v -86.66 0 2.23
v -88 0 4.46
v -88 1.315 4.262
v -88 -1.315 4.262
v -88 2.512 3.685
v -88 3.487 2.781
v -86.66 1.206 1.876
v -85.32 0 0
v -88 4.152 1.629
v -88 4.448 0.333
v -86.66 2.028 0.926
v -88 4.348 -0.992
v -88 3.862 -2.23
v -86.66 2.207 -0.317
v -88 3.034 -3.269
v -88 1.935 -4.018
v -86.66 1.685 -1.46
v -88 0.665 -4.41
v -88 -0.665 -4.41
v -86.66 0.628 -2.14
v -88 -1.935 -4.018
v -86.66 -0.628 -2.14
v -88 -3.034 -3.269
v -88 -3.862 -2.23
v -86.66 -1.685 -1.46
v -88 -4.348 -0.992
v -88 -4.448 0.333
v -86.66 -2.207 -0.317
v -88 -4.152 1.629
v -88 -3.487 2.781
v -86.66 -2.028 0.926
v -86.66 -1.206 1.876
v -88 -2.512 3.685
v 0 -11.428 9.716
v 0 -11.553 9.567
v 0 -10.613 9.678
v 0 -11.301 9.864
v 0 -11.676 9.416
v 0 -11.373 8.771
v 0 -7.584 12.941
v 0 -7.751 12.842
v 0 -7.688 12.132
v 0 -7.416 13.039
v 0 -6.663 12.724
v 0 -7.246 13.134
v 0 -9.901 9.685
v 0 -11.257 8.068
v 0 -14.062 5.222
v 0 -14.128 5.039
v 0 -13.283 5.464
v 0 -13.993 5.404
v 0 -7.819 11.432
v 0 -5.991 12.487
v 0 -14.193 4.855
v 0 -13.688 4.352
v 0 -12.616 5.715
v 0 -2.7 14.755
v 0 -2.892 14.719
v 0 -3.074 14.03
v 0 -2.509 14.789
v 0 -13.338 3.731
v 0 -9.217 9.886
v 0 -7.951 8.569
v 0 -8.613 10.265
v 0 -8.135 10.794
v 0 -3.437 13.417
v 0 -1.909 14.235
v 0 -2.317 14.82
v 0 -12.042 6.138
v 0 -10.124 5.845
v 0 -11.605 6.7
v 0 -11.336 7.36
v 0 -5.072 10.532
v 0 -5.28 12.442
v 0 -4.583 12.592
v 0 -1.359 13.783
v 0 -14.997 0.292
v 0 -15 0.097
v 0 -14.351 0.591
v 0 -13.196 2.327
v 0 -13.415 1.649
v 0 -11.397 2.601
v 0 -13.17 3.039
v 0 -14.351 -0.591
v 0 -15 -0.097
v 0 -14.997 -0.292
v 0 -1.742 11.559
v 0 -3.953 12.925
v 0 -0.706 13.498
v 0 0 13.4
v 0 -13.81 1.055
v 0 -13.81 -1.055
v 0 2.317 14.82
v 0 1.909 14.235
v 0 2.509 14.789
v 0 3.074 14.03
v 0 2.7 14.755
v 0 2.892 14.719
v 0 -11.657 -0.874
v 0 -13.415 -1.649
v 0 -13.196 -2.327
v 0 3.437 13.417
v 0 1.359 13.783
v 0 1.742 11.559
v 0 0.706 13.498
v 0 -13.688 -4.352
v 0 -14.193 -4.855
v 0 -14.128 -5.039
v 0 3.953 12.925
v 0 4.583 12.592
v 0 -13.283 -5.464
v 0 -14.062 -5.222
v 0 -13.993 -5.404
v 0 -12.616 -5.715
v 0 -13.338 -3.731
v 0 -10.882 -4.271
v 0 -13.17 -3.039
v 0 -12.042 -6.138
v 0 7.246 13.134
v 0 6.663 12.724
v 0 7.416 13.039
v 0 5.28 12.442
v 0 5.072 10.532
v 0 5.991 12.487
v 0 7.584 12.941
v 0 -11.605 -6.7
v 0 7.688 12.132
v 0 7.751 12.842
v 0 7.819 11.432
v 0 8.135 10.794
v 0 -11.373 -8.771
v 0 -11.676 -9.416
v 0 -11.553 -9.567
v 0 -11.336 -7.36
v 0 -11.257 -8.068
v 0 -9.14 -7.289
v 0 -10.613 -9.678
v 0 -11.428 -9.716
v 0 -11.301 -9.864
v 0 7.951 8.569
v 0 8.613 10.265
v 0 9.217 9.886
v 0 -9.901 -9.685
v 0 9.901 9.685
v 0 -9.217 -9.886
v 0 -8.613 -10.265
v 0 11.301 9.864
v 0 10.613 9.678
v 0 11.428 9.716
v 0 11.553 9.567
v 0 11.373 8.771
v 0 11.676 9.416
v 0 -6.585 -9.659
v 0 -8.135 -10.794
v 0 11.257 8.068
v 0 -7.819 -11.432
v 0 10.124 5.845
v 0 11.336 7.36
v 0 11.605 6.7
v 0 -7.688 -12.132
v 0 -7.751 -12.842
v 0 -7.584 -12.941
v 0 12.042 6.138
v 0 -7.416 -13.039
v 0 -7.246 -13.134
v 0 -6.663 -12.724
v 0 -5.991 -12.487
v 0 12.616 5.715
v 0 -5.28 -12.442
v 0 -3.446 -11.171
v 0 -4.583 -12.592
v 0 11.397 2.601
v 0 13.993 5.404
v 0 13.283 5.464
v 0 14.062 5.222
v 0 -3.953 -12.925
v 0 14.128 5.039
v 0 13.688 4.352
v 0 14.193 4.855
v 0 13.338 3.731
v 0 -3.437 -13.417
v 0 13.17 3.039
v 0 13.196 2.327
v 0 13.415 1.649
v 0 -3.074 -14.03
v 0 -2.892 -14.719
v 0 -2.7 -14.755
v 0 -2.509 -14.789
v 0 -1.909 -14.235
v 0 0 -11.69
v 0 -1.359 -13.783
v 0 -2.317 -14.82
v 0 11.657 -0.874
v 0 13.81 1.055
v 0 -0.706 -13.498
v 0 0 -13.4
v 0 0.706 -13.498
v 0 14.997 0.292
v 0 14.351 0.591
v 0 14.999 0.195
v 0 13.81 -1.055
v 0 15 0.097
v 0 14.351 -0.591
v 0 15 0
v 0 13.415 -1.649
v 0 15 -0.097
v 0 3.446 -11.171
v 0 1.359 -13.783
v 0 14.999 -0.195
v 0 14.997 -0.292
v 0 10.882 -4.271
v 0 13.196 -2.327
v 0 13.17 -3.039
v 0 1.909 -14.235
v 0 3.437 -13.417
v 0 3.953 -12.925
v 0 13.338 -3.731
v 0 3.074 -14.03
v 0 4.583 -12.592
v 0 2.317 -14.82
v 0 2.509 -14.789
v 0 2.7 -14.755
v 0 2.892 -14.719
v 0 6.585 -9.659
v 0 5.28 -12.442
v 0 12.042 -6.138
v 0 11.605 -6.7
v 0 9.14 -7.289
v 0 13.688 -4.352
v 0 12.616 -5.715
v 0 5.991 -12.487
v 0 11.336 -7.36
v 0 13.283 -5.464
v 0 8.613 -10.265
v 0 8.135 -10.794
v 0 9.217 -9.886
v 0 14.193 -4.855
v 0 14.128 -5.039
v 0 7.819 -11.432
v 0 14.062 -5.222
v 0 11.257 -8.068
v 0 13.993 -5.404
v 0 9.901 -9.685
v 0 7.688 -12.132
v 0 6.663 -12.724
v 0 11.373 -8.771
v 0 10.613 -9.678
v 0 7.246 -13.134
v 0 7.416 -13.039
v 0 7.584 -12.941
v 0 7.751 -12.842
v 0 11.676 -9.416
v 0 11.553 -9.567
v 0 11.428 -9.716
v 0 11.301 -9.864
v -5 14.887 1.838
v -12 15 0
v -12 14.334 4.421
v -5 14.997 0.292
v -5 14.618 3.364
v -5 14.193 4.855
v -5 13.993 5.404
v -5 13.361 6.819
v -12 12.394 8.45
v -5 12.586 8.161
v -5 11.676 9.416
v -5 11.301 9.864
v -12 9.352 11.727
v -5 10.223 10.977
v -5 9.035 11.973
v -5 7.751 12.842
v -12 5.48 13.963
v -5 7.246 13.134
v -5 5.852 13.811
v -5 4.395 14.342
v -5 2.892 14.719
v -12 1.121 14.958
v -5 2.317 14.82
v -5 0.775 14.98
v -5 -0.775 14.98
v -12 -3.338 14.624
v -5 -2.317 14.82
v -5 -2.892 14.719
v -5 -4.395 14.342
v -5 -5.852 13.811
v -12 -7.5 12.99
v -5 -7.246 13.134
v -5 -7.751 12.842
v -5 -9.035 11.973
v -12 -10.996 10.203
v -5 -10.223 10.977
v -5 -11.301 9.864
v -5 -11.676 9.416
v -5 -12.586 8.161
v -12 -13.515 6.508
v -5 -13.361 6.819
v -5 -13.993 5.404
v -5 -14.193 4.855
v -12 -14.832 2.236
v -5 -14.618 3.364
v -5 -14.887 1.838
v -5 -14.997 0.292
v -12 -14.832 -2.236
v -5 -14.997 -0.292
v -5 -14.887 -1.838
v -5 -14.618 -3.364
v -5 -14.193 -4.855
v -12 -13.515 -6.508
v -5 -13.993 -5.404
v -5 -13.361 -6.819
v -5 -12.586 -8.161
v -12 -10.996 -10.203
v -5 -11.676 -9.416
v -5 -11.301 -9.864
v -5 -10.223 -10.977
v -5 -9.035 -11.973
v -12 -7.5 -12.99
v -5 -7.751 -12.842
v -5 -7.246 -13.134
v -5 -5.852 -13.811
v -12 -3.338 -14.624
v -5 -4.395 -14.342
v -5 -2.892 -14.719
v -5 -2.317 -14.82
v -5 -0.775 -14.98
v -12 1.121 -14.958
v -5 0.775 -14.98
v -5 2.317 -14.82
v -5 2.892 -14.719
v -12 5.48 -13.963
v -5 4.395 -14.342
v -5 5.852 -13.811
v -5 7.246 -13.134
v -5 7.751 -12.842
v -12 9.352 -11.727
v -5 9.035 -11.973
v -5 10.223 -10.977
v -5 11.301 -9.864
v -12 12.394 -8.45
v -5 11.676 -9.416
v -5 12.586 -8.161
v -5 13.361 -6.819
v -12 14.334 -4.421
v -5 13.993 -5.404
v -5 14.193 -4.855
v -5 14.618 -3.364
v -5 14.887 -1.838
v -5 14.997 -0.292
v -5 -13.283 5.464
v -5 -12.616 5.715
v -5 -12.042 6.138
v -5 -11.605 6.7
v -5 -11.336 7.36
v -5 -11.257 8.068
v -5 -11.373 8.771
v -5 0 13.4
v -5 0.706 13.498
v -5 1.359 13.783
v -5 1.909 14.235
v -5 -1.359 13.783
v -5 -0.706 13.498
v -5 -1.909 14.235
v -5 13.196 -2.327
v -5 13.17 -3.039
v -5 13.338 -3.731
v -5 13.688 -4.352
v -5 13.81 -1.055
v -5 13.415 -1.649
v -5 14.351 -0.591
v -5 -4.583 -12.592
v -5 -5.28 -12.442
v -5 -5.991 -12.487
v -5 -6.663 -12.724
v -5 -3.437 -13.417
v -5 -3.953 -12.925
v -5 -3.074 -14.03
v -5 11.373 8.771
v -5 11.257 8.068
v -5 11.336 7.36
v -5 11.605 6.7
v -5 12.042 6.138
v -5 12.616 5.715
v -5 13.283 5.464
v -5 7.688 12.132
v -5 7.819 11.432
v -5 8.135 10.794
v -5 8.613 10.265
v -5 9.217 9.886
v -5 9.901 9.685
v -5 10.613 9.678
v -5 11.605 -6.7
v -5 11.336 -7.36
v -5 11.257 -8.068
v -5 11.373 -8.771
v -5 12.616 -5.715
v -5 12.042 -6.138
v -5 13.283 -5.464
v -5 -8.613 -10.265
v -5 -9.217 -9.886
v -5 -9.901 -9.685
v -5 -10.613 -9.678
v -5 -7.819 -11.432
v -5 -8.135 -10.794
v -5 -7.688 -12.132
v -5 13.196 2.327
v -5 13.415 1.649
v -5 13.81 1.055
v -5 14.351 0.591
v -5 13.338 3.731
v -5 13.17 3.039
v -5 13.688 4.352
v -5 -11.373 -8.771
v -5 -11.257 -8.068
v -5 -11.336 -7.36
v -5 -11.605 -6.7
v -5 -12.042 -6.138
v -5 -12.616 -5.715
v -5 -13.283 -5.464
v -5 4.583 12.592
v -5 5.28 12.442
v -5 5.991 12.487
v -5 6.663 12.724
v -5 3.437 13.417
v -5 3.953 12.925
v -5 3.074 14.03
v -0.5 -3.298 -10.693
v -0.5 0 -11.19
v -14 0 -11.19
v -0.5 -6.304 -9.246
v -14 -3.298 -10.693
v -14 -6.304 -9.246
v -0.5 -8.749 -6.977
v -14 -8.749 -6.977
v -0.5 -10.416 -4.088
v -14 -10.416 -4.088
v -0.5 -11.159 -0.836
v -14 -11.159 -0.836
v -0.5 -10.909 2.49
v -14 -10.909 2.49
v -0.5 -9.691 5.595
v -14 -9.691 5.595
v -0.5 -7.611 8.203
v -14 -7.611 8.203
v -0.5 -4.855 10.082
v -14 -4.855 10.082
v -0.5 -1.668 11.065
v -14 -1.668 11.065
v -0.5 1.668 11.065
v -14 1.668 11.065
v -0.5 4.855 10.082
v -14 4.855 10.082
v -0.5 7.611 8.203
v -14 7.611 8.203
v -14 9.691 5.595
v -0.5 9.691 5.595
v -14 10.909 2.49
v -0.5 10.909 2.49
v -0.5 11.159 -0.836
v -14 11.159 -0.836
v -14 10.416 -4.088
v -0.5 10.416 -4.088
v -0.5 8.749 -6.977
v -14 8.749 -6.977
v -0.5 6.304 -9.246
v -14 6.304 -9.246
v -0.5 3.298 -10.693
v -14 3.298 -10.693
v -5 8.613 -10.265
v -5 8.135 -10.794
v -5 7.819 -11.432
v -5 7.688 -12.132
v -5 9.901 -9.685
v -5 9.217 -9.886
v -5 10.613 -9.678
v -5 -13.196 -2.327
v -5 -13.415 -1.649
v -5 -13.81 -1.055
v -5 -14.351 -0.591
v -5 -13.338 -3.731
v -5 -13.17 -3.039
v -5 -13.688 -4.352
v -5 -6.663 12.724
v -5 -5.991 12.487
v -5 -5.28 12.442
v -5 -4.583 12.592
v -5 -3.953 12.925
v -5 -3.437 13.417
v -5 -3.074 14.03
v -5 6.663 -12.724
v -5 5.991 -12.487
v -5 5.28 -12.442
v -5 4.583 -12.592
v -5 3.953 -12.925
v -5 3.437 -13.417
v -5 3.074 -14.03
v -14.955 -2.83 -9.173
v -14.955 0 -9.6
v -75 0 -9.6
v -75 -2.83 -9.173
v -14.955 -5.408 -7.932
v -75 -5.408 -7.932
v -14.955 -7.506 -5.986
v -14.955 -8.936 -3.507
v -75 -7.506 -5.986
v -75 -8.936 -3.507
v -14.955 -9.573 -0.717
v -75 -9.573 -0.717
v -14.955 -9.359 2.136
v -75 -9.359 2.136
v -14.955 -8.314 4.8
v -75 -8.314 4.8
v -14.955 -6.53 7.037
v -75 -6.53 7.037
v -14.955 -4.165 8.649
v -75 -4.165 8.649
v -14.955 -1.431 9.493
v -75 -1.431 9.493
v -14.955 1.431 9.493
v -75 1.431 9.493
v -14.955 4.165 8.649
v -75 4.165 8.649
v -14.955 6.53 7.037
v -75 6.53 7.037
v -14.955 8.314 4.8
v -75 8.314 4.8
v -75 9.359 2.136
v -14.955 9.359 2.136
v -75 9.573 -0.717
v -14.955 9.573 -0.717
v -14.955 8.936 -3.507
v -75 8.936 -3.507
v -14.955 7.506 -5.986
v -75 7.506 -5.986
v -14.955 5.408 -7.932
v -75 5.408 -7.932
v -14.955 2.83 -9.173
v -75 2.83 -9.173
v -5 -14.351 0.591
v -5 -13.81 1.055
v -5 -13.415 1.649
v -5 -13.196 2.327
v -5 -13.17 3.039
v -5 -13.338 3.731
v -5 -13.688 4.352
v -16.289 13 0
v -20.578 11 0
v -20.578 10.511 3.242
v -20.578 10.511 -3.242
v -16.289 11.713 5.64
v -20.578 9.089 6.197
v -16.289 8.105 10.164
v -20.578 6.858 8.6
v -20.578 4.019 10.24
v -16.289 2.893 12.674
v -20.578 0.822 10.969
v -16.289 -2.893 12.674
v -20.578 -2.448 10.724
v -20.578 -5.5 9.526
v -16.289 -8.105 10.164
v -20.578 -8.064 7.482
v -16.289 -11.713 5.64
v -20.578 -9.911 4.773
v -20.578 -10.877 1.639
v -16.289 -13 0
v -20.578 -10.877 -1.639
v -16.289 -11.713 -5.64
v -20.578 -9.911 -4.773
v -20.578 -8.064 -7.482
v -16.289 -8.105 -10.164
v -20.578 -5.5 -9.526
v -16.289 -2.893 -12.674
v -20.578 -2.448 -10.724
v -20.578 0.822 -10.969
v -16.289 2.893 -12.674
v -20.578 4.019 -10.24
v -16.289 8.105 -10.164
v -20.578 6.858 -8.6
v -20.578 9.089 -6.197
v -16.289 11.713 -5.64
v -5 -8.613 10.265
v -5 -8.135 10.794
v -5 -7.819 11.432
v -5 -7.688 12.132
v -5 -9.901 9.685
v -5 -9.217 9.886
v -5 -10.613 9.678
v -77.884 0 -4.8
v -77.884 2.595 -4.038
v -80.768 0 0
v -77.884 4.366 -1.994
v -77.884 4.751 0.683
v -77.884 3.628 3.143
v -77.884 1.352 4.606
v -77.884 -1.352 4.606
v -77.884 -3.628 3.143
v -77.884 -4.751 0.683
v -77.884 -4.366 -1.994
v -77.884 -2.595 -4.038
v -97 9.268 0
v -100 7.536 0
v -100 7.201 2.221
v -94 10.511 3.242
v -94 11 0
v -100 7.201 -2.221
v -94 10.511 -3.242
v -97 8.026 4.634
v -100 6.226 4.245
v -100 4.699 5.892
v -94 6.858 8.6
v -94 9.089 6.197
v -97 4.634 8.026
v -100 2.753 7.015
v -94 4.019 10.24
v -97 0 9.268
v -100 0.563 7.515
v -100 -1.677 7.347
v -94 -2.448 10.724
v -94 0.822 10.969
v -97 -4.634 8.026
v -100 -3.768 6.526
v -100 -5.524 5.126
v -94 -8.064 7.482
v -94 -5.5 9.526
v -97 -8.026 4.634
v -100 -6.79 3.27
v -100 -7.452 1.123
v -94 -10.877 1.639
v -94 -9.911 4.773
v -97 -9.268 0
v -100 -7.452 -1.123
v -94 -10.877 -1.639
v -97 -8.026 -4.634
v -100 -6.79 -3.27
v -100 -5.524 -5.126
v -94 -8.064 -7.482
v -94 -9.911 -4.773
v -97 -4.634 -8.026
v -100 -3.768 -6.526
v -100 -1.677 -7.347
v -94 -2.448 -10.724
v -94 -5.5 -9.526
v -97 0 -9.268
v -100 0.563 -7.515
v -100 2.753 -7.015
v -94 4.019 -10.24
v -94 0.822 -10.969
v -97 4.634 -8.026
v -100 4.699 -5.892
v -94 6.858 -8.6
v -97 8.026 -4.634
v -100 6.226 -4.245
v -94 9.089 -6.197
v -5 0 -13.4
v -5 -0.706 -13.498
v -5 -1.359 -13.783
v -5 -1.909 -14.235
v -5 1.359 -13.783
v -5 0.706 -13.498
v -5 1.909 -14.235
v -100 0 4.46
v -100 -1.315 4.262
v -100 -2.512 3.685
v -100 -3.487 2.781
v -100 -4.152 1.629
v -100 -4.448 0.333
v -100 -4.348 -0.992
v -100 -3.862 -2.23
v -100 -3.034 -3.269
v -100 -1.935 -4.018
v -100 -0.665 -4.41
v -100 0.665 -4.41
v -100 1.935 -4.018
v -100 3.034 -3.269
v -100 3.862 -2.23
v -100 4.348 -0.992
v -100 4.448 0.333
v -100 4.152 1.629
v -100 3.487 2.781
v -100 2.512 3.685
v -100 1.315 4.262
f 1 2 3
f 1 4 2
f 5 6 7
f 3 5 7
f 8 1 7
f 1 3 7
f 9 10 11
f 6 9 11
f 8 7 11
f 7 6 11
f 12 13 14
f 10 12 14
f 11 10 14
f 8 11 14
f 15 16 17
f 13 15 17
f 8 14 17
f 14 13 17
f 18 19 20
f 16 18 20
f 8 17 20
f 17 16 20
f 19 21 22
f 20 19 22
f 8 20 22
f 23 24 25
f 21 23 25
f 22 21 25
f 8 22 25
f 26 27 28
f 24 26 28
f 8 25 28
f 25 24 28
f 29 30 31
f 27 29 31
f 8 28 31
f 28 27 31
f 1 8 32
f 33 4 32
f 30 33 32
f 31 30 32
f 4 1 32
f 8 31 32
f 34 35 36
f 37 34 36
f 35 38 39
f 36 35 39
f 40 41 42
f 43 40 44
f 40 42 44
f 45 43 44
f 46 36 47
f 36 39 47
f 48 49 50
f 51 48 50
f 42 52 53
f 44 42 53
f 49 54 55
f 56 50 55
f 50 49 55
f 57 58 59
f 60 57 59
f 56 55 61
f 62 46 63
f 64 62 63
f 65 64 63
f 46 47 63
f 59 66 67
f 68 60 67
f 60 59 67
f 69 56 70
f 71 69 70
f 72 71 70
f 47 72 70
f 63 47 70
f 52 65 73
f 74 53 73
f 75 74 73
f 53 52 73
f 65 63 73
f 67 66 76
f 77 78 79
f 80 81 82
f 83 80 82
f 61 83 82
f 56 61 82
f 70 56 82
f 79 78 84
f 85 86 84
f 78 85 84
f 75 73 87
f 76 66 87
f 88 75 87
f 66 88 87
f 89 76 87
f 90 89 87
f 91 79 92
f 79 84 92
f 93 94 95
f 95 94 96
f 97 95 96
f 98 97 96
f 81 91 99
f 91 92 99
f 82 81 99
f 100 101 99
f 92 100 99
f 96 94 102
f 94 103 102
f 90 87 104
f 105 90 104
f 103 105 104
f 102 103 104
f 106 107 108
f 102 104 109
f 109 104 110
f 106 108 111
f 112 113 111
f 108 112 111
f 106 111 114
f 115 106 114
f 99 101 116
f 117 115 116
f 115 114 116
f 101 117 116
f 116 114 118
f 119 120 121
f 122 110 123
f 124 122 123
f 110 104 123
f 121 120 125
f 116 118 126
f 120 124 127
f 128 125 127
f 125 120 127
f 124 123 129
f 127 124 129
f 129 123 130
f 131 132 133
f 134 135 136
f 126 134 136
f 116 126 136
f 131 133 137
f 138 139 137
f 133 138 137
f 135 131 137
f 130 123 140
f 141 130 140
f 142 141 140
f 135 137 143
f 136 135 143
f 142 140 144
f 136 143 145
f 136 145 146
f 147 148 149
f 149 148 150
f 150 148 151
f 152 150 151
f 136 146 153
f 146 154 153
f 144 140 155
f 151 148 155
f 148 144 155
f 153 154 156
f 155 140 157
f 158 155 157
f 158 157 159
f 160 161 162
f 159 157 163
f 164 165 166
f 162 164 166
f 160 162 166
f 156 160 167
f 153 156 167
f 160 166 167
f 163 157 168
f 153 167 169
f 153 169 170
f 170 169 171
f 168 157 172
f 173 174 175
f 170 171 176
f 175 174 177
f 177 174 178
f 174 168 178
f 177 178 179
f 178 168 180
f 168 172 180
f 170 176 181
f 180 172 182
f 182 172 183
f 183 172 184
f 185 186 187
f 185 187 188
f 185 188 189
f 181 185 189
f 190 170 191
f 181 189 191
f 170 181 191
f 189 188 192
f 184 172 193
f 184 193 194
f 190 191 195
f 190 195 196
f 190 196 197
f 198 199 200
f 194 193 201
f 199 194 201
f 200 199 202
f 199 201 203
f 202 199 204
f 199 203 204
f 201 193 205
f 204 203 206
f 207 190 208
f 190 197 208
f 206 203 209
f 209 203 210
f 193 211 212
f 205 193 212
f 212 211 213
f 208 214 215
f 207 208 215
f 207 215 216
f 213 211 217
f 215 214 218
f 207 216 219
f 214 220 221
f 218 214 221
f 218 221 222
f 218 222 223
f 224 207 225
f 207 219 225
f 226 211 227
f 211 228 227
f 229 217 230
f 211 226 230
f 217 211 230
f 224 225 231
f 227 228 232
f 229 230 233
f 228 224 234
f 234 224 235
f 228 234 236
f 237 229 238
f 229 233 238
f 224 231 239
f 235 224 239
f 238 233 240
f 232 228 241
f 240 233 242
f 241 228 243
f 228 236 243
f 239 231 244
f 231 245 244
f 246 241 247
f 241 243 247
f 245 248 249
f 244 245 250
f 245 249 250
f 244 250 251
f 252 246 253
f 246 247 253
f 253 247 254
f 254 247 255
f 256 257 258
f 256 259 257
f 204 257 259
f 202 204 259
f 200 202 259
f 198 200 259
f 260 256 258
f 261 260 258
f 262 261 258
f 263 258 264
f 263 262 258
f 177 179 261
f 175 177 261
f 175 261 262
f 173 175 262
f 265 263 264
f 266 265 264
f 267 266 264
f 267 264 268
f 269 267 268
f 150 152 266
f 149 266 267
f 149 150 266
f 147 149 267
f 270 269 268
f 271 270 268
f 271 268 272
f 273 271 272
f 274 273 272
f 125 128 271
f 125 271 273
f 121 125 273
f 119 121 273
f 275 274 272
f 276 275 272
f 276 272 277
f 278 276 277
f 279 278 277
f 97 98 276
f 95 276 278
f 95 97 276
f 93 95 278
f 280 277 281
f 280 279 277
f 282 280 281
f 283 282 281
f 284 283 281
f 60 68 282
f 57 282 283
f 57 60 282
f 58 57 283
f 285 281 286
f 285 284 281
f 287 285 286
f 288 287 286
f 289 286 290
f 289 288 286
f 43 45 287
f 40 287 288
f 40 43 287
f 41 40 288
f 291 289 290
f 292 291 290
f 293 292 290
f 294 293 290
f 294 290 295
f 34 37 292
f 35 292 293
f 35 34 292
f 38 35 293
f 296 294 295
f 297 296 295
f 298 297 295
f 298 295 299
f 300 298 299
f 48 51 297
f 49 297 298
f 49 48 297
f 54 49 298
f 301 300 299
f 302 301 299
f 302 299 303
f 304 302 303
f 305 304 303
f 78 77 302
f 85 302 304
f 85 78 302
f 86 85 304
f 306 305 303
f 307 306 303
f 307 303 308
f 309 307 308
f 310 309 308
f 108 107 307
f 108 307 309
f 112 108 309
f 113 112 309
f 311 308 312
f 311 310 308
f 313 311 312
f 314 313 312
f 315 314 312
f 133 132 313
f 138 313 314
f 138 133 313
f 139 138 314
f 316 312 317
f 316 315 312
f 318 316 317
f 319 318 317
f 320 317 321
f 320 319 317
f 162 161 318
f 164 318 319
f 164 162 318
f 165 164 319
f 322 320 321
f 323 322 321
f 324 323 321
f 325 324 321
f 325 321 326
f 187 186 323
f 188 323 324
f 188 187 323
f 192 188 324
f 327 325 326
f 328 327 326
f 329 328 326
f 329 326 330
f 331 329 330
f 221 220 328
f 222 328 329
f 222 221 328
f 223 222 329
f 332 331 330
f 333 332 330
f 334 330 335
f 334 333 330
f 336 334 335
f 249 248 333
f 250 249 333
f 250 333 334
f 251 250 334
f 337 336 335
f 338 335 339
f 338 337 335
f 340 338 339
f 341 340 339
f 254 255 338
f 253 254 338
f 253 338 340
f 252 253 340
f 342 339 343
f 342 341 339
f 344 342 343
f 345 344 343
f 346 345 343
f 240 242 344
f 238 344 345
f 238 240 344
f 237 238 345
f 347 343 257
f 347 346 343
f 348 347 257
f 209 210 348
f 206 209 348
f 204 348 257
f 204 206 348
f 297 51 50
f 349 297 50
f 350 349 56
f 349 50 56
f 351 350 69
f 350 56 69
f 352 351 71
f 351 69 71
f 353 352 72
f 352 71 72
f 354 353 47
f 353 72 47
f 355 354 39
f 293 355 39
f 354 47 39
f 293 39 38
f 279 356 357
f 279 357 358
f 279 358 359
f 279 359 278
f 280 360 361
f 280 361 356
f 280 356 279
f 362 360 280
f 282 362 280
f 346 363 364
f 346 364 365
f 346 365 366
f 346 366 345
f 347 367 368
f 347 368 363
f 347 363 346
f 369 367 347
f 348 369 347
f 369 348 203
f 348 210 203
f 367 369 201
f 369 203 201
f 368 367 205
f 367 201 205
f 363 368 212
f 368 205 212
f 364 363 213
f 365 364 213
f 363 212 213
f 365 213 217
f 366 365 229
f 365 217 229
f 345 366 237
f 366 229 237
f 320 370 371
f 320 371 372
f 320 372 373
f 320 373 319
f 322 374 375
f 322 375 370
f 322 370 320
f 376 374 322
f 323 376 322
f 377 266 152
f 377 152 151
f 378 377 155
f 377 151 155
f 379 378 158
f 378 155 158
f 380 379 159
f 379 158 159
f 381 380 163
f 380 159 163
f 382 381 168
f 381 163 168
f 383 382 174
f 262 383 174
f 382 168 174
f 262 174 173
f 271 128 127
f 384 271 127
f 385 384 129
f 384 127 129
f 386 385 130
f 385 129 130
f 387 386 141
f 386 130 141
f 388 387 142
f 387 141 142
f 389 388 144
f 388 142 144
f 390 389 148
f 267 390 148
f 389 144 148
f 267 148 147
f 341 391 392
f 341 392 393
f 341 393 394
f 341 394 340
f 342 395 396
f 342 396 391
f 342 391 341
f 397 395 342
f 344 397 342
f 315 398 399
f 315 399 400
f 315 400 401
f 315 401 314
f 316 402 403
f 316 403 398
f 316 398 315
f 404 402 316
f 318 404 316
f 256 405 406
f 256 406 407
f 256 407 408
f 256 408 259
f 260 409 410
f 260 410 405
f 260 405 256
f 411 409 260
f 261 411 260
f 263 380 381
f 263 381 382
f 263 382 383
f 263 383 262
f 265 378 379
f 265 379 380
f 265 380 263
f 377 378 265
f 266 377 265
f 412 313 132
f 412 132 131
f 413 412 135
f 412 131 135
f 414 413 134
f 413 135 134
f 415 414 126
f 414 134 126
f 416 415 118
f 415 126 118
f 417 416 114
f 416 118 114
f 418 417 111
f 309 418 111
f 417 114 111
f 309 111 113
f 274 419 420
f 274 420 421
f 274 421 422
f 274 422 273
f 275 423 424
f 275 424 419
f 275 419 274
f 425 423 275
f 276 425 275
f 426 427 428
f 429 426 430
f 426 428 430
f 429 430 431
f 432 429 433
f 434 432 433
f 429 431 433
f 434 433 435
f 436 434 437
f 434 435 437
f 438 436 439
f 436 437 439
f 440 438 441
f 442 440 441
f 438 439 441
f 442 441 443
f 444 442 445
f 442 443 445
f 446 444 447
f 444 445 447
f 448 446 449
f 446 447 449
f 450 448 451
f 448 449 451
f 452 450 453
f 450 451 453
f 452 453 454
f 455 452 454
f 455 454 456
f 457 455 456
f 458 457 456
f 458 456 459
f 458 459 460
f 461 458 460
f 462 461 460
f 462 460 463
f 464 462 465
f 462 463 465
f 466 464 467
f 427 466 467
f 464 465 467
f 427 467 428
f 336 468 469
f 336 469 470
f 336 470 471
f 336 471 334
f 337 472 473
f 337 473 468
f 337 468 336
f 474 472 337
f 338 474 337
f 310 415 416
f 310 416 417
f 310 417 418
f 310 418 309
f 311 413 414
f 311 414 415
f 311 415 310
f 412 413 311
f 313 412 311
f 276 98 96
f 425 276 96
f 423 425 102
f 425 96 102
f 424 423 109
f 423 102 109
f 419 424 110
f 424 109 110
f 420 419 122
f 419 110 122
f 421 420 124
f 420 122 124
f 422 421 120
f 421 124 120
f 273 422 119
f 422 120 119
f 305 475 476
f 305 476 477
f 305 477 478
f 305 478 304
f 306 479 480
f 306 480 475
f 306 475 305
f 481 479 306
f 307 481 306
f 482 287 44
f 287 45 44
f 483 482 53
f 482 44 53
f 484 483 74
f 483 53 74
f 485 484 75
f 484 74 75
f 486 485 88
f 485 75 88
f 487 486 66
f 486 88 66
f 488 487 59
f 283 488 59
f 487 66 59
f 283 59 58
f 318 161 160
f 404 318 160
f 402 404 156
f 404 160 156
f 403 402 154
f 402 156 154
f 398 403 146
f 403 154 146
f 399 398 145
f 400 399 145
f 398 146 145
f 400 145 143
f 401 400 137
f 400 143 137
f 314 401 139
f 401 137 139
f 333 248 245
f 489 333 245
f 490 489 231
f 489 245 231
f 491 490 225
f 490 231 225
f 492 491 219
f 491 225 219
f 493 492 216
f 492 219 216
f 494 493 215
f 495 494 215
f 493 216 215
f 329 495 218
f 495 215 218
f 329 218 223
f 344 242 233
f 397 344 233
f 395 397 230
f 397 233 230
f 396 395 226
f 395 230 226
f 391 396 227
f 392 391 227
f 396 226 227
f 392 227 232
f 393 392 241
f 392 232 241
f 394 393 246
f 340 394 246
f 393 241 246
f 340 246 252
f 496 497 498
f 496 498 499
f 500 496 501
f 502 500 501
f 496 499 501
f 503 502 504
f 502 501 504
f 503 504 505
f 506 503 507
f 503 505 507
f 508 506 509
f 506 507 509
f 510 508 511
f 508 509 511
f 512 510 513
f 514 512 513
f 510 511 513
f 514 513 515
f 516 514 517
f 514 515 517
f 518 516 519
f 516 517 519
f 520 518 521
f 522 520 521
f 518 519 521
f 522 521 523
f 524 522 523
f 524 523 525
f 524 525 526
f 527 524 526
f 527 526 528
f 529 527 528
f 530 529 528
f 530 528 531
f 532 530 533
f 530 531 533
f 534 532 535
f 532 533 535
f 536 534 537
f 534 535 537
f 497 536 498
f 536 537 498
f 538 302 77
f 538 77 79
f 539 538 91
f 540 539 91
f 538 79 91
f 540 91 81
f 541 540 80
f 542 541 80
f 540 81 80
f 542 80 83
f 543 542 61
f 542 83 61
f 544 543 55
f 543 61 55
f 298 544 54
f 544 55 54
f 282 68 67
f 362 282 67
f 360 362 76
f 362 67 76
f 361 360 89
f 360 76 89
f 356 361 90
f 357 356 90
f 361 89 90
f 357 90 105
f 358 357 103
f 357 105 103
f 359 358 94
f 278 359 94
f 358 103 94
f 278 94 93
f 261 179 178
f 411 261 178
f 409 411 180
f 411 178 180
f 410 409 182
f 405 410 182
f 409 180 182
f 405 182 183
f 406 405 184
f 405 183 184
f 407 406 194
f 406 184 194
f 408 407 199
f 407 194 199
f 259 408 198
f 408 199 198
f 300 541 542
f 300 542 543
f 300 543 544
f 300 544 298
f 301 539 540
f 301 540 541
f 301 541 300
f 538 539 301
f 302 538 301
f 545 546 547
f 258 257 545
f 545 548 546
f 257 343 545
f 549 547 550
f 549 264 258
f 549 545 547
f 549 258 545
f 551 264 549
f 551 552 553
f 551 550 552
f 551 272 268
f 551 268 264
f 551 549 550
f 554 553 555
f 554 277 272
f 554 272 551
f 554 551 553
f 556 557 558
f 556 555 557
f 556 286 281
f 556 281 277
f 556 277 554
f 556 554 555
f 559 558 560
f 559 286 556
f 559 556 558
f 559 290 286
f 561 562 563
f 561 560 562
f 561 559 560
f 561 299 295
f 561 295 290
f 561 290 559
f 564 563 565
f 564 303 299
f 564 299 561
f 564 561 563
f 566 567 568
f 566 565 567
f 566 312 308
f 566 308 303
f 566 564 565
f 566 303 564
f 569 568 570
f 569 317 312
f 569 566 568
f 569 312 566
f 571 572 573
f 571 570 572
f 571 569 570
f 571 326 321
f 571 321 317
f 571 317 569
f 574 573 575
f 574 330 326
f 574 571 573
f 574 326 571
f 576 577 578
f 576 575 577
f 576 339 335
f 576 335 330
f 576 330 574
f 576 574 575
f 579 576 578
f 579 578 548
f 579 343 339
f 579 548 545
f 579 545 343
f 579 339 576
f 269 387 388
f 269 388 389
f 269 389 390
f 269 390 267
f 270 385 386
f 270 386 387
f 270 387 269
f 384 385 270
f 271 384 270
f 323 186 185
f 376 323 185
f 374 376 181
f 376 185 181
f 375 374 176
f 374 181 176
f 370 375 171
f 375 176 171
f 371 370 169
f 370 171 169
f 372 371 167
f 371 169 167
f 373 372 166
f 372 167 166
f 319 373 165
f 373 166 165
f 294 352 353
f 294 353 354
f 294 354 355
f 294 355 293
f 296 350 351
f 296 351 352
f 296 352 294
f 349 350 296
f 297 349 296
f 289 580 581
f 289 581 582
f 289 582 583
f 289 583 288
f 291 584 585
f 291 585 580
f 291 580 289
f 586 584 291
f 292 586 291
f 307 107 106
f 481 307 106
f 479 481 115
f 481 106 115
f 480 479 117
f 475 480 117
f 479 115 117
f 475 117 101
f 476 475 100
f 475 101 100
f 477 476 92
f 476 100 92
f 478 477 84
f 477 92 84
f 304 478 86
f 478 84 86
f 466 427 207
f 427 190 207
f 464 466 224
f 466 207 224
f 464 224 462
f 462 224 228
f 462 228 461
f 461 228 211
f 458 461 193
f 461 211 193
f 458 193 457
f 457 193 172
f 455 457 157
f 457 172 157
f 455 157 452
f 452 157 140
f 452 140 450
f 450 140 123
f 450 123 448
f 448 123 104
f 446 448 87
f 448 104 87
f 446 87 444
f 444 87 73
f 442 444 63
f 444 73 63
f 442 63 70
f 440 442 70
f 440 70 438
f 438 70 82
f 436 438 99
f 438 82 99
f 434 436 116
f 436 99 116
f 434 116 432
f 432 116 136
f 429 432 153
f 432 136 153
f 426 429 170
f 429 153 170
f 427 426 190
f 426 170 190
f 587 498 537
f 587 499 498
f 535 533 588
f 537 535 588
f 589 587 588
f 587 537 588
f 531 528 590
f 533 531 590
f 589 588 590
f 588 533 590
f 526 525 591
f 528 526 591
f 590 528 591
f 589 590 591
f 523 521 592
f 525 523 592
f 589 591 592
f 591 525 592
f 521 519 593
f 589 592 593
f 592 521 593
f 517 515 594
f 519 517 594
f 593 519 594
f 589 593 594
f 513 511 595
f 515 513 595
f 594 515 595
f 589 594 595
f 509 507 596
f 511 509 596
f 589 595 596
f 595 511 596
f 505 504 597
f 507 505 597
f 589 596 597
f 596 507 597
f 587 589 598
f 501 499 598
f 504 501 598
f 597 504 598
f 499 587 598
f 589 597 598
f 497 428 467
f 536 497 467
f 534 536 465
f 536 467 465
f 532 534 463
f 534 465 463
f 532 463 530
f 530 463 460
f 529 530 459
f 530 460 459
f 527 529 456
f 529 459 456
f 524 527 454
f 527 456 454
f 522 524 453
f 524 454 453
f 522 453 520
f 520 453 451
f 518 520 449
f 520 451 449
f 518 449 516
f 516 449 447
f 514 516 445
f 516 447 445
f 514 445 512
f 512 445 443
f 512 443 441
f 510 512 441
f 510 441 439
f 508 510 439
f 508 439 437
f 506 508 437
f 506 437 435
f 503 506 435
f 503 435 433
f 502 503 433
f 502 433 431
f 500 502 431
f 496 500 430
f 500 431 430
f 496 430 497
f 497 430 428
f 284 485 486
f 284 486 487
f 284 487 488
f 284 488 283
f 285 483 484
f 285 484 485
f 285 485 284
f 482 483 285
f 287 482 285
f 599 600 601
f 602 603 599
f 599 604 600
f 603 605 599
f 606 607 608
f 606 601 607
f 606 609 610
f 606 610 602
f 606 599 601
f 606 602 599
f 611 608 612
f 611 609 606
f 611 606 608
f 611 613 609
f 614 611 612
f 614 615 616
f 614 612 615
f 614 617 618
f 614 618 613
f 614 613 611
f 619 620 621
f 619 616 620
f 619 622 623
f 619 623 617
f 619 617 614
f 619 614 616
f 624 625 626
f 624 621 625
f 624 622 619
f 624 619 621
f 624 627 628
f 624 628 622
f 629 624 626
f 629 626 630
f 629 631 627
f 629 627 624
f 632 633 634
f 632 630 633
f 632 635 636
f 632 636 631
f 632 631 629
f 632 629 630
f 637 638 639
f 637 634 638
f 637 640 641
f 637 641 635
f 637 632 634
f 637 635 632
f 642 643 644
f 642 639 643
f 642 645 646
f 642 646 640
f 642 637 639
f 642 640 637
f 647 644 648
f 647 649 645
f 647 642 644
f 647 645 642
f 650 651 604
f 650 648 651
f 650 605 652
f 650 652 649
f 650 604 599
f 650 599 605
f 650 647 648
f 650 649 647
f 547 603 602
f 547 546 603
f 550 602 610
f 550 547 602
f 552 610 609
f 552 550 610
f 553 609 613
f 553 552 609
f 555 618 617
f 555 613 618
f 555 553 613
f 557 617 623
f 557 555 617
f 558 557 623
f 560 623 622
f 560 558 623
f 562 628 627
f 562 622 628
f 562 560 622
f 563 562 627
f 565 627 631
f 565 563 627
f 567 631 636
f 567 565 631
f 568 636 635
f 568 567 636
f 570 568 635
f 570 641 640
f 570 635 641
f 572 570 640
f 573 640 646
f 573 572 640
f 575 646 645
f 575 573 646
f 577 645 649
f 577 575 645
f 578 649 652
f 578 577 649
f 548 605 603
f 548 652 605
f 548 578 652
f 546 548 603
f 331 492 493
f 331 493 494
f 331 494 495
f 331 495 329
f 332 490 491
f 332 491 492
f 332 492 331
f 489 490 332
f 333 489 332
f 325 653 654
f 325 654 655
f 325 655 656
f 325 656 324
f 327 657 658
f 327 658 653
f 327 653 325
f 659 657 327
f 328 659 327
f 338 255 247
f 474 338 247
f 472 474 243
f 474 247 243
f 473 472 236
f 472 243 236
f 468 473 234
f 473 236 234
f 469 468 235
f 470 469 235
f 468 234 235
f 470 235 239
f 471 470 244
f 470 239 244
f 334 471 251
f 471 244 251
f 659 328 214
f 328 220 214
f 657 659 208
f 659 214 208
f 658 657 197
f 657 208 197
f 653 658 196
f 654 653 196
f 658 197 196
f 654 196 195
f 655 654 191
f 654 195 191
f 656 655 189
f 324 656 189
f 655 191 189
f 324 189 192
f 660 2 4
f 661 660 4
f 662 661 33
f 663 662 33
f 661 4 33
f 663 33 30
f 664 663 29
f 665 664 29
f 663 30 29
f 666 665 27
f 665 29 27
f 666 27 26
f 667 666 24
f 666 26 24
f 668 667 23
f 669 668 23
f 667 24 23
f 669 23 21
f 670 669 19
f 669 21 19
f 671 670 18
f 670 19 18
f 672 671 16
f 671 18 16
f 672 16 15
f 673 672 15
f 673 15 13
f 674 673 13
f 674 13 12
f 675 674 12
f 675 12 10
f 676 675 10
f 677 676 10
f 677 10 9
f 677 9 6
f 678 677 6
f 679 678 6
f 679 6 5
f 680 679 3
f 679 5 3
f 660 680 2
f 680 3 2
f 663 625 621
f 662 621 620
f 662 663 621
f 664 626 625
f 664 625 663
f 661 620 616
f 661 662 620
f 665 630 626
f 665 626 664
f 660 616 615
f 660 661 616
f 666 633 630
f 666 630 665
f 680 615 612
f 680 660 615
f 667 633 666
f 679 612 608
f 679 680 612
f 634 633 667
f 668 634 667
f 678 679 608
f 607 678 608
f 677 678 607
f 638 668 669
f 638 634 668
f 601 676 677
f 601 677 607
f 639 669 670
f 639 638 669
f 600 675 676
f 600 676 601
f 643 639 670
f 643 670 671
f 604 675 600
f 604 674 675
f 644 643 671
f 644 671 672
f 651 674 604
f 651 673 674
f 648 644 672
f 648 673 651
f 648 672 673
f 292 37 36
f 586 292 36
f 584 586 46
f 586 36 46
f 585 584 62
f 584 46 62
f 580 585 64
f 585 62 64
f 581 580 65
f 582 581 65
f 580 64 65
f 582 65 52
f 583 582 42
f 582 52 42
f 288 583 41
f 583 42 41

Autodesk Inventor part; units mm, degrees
ref_plane "YZ Plane" through (0, 0, 0) normal (1, 0, 0) x (0, 1, 0)
ref_plane "XZ Plane" through (0, 0, 0) normal (0, 1, 0) x (-1, 0, 0)
ref_plane "XY Plane" through (0, 0, 0) normal (0, 0, 1) x (1, 0, 0)
sketch "Náčrt1" plane through (0, 0, 0) normal (0, 0, 1) x (1, 0, 0)
  line L0 (0, 0) -> (-100, 0)
  line L1 (-100, 0) -> (-100, 11)
  line L2 (-100, 11) -> (-20.578, 11)
  line L3 (-20.578, 11) -> (-12, 15)
  line L4 (-12, 15) -> (0, 15)
  line L5 (0, 15) -> (0, 0)
  dimension "d2" = 22
  dimension "d3" = 30
  dimension "d4" = 12
  dimension "d5" = 25
  dimension "d6" = 100
revolve "Rotace1" add sketch "Náčrt1" angle 360 about axis through (0, 0, 0) along (-1, 0, 0)
hole "Díra1" at (0, 0, 0) direction (-1, 0, 0) diameter 22.38 depth 14 tip angle 118
hole "Díra2" at (0, 0, 0) direction (-1, 0, 0) diameter 19.2 depth 75 tip angle 118
hole "Díra3" at (-100, 0, 0) direction (1, 0, 0) diameter 8.92 depth 12 tip angle 118
chamfer "Zkosení1" distance 6 angle 30 1 edges at (-100, -11, 0) measured on face at (-47.052, 10.8576, 1.7645)
sketch "Náčrt2" plane through (0, 0, 0) normal (1, 0, 0) x (0, 0, -1)
  circle A0 centre (16, 0) radius 2.6
  point P0 (0, 0)
  dimension "d40" = 16
  dimension "d41" = 5.2
extrude "Vysunutí1" cut sketch "Náčrt2" against normal blind 5
pattern_circular "Kruhové pole1" count 18 over 360 about axis through (-6, 0, 0) along (1, 0, 0) of "Vysunutí1"
chamfer "Zkosení2" distance 0.5 angle 45 1 edges at (0, 0, 11.19)
properties part number "Head02" material "ETG 100"
